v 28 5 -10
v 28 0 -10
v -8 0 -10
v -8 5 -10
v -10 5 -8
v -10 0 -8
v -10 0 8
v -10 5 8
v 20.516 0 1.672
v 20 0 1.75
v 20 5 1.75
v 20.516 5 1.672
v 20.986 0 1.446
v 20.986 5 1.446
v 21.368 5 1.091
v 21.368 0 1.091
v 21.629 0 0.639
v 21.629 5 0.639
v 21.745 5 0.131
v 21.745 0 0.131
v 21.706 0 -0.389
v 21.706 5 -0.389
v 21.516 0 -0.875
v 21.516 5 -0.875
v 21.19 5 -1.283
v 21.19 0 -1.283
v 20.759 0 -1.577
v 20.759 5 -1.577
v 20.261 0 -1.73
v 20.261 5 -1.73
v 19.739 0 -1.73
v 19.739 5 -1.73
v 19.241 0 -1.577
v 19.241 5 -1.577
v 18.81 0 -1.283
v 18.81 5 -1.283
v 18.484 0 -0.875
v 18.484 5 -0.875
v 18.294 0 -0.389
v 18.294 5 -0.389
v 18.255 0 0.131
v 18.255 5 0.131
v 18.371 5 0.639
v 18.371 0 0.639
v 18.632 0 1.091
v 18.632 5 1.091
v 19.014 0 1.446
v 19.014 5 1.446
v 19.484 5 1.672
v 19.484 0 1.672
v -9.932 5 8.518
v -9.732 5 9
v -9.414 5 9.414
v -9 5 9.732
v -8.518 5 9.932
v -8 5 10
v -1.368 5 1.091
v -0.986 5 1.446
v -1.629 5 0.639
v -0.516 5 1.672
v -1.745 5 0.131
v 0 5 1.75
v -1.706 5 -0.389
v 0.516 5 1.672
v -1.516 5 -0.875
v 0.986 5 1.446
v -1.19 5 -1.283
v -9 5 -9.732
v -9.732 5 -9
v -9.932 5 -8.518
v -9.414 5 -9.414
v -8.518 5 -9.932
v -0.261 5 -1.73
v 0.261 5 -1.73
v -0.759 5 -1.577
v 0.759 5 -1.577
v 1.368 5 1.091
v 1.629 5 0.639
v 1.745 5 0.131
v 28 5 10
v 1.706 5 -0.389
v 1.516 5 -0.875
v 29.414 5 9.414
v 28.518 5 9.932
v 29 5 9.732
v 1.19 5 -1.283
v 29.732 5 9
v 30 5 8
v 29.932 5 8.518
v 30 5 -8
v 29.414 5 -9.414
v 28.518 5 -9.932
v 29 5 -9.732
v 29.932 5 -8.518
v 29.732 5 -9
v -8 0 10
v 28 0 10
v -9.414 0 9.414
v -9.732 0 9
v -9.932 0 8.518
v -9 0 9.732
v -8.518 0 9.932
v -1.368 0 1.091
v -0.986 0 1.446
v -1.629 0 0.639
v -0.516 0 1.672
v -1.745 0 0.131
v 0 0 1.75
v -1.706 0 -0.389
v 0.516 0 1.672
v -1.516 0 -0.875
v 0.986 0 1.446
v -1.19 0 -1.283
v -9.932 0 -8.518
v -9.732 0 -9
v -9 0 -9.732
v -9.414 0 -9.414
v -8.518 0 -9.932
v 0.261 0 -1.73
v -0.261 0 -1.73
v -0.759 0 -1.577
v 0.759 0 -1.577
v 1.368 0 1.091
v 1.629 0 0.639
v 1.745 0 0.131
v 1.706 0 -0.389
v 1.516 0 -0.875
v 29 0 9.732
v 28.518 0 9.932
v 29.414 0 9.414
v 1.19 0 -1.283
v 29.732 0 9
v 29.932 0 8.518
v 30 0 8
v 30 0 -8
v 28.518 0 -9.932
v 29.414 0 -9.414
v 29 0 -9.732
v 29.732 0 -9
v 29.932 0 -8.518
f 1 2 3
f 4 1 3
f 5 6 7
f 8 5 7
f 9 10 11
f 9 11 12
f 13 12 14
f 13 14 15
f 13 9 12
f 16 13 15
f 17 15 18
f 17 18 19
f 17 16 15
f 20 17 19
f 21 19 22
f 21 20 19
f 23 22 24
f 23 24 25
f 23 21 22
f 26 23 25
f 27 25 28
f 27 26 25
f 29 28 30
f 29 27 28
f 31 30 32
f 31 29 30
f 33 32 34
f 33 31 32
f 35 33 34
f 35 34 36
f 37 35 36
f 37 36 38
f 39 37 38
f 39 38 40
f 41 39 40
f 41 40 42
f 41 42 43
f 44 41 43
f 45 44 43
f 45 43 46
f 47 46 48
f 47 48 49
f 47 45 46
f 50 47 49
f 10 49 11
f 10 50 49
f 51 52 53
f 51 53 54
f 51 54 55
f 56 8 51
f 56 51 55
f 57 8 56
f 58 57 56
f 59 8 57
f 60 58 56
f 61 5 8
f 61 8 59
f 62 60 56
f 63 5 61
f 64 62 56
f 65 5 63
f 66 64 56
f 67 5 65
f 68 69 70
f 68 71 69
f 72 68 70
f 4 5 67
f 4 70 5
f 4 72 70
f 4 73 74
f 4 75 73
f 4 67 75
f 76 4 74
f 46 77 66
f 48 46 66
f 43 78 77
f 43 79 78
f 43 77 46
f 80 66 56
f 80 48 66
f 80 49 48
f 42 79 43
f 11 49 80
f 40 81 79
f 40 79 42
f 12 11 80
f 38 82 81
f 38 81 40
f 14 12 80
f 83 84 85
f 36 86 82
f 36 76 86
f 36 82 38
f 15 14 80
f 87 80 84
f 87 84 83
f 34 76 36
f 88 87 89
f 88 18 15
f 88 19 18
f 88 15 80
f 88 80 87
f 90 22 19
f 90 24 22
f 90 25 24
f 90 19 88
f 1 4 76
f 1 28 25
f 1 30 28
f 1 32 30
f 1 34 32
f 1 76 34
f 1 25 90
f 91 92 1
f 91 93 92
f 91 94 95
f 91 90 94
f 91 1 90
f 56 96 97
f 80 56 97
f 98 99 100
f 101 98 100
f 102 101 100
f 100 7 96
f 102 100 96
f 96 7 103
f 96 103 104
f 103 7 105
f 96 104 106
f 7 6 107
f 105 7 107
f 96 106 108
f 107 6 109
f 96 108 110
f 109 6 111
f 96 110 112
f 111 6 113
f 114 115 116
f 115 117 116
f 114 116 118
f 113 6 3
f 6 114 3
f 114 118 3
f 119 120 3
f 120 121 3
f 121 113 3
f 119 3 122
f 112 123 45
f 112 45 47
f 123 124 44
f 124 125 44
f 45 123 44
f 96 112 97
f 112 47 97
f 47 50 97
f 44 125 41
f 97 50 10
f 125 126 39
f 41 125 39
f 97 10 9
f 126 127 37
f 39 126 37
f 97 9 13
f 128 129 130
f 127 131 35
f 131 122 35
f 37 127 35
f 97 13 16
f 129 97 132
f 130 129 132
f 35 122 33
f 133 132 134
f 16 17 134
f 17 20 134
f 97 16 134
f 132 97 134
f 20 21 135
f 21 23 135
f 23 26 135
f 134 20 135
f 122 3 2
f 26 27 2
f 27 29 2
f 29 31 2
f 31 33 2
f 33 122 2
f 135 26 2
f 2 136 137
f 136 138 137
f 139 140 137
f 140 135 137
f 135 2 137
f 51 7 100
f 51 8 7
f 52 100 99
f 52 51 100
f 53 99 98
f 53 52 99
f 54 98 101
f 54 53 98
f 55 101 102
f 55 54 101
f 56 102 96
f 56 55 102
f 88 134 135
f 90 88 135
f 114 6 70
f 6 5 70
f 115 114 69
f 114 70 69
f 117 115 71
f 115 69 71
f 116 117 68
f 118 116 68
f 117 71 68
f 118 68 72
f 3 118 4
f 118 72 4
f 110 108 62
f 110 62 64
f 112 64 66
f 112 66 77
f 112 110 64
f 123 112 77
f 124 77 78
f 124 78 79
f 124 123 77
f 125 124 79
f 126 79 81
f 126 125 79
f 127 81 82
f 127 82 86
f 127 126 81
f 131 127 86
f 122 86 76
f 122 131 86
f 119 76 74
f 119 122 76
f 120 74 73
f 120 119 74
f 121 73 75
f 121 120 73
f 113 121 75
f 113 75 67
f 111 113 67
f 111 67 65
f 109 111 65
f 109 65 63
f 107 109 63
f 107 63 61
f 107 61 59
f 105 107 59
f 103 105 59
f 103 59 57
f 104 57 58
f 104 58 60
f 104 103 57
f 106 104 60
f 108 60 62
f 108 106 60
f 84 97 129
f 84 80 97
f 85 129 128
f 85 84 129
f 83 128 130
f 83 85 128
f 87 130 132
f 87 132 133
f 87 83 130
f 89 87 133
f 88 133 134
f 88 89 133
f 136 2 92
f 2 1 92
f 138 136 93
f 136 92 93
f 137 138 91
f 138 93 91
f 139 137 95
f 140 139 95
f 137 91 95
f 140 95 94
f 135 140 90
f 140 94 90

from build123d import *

# Parameters (mm, degrees)
SKETCH_1_R      = 1.75
EXTRUDE_1_DEPTH = 5
FILLET_1_R      = 2
FILLET_2_R      = 2
FILLET_3_R      = 2


with BuildPart() as part:
    # 草图1 → 凸台-拉伸1 (new body)
    with BuildSketch(Plane(origin=(0, 0, 0), x_dir=(1, 0, 0), z_dir=(0, 1, 0))):
        Polygon((-10, 10), (-10, -10), (10, -10), (30, -10), (30, 10), (10, 10), align=None)
        with Locations(Location((0, 0, 0), (0, 0, 270))):
            Circle(SKETCH_1_R, mode=Mode.SUBTRACT)
        with Locations(Location((20, 0, 0), (0, 0, 270))):
            Circle(SKETCH_1_R, mode=Mode.SUBTRACT)
    extrude(amount=EXTRUDE_1_DEPTH)

    # 圆角1
    fillet_1_edges = [part.edges().sort_by_distance(p)[0] for p in [
        (30, 2.5, 10),
        (30, 2.5, -10),
    ]]
    fillet(fillet_1_edges, radius=FILLET_1_R)

    # 圆角2
    fillet_2_edges = [part.edges().sort_by_distance(p)[0] for p in [
        (-10, 2.5, 10),
    ]]
    fillet(fillet_2_edges, radius=FILLET_2_R)

    # 圆角3
    fillet_3_edges = [part.edges().sort_by_distance(p)[0] for p in [
        (-10, 2.5, -10),
    ]]
    fillet(fillet_3_edges, radius=FILLET_3_R)


solid = part.part
